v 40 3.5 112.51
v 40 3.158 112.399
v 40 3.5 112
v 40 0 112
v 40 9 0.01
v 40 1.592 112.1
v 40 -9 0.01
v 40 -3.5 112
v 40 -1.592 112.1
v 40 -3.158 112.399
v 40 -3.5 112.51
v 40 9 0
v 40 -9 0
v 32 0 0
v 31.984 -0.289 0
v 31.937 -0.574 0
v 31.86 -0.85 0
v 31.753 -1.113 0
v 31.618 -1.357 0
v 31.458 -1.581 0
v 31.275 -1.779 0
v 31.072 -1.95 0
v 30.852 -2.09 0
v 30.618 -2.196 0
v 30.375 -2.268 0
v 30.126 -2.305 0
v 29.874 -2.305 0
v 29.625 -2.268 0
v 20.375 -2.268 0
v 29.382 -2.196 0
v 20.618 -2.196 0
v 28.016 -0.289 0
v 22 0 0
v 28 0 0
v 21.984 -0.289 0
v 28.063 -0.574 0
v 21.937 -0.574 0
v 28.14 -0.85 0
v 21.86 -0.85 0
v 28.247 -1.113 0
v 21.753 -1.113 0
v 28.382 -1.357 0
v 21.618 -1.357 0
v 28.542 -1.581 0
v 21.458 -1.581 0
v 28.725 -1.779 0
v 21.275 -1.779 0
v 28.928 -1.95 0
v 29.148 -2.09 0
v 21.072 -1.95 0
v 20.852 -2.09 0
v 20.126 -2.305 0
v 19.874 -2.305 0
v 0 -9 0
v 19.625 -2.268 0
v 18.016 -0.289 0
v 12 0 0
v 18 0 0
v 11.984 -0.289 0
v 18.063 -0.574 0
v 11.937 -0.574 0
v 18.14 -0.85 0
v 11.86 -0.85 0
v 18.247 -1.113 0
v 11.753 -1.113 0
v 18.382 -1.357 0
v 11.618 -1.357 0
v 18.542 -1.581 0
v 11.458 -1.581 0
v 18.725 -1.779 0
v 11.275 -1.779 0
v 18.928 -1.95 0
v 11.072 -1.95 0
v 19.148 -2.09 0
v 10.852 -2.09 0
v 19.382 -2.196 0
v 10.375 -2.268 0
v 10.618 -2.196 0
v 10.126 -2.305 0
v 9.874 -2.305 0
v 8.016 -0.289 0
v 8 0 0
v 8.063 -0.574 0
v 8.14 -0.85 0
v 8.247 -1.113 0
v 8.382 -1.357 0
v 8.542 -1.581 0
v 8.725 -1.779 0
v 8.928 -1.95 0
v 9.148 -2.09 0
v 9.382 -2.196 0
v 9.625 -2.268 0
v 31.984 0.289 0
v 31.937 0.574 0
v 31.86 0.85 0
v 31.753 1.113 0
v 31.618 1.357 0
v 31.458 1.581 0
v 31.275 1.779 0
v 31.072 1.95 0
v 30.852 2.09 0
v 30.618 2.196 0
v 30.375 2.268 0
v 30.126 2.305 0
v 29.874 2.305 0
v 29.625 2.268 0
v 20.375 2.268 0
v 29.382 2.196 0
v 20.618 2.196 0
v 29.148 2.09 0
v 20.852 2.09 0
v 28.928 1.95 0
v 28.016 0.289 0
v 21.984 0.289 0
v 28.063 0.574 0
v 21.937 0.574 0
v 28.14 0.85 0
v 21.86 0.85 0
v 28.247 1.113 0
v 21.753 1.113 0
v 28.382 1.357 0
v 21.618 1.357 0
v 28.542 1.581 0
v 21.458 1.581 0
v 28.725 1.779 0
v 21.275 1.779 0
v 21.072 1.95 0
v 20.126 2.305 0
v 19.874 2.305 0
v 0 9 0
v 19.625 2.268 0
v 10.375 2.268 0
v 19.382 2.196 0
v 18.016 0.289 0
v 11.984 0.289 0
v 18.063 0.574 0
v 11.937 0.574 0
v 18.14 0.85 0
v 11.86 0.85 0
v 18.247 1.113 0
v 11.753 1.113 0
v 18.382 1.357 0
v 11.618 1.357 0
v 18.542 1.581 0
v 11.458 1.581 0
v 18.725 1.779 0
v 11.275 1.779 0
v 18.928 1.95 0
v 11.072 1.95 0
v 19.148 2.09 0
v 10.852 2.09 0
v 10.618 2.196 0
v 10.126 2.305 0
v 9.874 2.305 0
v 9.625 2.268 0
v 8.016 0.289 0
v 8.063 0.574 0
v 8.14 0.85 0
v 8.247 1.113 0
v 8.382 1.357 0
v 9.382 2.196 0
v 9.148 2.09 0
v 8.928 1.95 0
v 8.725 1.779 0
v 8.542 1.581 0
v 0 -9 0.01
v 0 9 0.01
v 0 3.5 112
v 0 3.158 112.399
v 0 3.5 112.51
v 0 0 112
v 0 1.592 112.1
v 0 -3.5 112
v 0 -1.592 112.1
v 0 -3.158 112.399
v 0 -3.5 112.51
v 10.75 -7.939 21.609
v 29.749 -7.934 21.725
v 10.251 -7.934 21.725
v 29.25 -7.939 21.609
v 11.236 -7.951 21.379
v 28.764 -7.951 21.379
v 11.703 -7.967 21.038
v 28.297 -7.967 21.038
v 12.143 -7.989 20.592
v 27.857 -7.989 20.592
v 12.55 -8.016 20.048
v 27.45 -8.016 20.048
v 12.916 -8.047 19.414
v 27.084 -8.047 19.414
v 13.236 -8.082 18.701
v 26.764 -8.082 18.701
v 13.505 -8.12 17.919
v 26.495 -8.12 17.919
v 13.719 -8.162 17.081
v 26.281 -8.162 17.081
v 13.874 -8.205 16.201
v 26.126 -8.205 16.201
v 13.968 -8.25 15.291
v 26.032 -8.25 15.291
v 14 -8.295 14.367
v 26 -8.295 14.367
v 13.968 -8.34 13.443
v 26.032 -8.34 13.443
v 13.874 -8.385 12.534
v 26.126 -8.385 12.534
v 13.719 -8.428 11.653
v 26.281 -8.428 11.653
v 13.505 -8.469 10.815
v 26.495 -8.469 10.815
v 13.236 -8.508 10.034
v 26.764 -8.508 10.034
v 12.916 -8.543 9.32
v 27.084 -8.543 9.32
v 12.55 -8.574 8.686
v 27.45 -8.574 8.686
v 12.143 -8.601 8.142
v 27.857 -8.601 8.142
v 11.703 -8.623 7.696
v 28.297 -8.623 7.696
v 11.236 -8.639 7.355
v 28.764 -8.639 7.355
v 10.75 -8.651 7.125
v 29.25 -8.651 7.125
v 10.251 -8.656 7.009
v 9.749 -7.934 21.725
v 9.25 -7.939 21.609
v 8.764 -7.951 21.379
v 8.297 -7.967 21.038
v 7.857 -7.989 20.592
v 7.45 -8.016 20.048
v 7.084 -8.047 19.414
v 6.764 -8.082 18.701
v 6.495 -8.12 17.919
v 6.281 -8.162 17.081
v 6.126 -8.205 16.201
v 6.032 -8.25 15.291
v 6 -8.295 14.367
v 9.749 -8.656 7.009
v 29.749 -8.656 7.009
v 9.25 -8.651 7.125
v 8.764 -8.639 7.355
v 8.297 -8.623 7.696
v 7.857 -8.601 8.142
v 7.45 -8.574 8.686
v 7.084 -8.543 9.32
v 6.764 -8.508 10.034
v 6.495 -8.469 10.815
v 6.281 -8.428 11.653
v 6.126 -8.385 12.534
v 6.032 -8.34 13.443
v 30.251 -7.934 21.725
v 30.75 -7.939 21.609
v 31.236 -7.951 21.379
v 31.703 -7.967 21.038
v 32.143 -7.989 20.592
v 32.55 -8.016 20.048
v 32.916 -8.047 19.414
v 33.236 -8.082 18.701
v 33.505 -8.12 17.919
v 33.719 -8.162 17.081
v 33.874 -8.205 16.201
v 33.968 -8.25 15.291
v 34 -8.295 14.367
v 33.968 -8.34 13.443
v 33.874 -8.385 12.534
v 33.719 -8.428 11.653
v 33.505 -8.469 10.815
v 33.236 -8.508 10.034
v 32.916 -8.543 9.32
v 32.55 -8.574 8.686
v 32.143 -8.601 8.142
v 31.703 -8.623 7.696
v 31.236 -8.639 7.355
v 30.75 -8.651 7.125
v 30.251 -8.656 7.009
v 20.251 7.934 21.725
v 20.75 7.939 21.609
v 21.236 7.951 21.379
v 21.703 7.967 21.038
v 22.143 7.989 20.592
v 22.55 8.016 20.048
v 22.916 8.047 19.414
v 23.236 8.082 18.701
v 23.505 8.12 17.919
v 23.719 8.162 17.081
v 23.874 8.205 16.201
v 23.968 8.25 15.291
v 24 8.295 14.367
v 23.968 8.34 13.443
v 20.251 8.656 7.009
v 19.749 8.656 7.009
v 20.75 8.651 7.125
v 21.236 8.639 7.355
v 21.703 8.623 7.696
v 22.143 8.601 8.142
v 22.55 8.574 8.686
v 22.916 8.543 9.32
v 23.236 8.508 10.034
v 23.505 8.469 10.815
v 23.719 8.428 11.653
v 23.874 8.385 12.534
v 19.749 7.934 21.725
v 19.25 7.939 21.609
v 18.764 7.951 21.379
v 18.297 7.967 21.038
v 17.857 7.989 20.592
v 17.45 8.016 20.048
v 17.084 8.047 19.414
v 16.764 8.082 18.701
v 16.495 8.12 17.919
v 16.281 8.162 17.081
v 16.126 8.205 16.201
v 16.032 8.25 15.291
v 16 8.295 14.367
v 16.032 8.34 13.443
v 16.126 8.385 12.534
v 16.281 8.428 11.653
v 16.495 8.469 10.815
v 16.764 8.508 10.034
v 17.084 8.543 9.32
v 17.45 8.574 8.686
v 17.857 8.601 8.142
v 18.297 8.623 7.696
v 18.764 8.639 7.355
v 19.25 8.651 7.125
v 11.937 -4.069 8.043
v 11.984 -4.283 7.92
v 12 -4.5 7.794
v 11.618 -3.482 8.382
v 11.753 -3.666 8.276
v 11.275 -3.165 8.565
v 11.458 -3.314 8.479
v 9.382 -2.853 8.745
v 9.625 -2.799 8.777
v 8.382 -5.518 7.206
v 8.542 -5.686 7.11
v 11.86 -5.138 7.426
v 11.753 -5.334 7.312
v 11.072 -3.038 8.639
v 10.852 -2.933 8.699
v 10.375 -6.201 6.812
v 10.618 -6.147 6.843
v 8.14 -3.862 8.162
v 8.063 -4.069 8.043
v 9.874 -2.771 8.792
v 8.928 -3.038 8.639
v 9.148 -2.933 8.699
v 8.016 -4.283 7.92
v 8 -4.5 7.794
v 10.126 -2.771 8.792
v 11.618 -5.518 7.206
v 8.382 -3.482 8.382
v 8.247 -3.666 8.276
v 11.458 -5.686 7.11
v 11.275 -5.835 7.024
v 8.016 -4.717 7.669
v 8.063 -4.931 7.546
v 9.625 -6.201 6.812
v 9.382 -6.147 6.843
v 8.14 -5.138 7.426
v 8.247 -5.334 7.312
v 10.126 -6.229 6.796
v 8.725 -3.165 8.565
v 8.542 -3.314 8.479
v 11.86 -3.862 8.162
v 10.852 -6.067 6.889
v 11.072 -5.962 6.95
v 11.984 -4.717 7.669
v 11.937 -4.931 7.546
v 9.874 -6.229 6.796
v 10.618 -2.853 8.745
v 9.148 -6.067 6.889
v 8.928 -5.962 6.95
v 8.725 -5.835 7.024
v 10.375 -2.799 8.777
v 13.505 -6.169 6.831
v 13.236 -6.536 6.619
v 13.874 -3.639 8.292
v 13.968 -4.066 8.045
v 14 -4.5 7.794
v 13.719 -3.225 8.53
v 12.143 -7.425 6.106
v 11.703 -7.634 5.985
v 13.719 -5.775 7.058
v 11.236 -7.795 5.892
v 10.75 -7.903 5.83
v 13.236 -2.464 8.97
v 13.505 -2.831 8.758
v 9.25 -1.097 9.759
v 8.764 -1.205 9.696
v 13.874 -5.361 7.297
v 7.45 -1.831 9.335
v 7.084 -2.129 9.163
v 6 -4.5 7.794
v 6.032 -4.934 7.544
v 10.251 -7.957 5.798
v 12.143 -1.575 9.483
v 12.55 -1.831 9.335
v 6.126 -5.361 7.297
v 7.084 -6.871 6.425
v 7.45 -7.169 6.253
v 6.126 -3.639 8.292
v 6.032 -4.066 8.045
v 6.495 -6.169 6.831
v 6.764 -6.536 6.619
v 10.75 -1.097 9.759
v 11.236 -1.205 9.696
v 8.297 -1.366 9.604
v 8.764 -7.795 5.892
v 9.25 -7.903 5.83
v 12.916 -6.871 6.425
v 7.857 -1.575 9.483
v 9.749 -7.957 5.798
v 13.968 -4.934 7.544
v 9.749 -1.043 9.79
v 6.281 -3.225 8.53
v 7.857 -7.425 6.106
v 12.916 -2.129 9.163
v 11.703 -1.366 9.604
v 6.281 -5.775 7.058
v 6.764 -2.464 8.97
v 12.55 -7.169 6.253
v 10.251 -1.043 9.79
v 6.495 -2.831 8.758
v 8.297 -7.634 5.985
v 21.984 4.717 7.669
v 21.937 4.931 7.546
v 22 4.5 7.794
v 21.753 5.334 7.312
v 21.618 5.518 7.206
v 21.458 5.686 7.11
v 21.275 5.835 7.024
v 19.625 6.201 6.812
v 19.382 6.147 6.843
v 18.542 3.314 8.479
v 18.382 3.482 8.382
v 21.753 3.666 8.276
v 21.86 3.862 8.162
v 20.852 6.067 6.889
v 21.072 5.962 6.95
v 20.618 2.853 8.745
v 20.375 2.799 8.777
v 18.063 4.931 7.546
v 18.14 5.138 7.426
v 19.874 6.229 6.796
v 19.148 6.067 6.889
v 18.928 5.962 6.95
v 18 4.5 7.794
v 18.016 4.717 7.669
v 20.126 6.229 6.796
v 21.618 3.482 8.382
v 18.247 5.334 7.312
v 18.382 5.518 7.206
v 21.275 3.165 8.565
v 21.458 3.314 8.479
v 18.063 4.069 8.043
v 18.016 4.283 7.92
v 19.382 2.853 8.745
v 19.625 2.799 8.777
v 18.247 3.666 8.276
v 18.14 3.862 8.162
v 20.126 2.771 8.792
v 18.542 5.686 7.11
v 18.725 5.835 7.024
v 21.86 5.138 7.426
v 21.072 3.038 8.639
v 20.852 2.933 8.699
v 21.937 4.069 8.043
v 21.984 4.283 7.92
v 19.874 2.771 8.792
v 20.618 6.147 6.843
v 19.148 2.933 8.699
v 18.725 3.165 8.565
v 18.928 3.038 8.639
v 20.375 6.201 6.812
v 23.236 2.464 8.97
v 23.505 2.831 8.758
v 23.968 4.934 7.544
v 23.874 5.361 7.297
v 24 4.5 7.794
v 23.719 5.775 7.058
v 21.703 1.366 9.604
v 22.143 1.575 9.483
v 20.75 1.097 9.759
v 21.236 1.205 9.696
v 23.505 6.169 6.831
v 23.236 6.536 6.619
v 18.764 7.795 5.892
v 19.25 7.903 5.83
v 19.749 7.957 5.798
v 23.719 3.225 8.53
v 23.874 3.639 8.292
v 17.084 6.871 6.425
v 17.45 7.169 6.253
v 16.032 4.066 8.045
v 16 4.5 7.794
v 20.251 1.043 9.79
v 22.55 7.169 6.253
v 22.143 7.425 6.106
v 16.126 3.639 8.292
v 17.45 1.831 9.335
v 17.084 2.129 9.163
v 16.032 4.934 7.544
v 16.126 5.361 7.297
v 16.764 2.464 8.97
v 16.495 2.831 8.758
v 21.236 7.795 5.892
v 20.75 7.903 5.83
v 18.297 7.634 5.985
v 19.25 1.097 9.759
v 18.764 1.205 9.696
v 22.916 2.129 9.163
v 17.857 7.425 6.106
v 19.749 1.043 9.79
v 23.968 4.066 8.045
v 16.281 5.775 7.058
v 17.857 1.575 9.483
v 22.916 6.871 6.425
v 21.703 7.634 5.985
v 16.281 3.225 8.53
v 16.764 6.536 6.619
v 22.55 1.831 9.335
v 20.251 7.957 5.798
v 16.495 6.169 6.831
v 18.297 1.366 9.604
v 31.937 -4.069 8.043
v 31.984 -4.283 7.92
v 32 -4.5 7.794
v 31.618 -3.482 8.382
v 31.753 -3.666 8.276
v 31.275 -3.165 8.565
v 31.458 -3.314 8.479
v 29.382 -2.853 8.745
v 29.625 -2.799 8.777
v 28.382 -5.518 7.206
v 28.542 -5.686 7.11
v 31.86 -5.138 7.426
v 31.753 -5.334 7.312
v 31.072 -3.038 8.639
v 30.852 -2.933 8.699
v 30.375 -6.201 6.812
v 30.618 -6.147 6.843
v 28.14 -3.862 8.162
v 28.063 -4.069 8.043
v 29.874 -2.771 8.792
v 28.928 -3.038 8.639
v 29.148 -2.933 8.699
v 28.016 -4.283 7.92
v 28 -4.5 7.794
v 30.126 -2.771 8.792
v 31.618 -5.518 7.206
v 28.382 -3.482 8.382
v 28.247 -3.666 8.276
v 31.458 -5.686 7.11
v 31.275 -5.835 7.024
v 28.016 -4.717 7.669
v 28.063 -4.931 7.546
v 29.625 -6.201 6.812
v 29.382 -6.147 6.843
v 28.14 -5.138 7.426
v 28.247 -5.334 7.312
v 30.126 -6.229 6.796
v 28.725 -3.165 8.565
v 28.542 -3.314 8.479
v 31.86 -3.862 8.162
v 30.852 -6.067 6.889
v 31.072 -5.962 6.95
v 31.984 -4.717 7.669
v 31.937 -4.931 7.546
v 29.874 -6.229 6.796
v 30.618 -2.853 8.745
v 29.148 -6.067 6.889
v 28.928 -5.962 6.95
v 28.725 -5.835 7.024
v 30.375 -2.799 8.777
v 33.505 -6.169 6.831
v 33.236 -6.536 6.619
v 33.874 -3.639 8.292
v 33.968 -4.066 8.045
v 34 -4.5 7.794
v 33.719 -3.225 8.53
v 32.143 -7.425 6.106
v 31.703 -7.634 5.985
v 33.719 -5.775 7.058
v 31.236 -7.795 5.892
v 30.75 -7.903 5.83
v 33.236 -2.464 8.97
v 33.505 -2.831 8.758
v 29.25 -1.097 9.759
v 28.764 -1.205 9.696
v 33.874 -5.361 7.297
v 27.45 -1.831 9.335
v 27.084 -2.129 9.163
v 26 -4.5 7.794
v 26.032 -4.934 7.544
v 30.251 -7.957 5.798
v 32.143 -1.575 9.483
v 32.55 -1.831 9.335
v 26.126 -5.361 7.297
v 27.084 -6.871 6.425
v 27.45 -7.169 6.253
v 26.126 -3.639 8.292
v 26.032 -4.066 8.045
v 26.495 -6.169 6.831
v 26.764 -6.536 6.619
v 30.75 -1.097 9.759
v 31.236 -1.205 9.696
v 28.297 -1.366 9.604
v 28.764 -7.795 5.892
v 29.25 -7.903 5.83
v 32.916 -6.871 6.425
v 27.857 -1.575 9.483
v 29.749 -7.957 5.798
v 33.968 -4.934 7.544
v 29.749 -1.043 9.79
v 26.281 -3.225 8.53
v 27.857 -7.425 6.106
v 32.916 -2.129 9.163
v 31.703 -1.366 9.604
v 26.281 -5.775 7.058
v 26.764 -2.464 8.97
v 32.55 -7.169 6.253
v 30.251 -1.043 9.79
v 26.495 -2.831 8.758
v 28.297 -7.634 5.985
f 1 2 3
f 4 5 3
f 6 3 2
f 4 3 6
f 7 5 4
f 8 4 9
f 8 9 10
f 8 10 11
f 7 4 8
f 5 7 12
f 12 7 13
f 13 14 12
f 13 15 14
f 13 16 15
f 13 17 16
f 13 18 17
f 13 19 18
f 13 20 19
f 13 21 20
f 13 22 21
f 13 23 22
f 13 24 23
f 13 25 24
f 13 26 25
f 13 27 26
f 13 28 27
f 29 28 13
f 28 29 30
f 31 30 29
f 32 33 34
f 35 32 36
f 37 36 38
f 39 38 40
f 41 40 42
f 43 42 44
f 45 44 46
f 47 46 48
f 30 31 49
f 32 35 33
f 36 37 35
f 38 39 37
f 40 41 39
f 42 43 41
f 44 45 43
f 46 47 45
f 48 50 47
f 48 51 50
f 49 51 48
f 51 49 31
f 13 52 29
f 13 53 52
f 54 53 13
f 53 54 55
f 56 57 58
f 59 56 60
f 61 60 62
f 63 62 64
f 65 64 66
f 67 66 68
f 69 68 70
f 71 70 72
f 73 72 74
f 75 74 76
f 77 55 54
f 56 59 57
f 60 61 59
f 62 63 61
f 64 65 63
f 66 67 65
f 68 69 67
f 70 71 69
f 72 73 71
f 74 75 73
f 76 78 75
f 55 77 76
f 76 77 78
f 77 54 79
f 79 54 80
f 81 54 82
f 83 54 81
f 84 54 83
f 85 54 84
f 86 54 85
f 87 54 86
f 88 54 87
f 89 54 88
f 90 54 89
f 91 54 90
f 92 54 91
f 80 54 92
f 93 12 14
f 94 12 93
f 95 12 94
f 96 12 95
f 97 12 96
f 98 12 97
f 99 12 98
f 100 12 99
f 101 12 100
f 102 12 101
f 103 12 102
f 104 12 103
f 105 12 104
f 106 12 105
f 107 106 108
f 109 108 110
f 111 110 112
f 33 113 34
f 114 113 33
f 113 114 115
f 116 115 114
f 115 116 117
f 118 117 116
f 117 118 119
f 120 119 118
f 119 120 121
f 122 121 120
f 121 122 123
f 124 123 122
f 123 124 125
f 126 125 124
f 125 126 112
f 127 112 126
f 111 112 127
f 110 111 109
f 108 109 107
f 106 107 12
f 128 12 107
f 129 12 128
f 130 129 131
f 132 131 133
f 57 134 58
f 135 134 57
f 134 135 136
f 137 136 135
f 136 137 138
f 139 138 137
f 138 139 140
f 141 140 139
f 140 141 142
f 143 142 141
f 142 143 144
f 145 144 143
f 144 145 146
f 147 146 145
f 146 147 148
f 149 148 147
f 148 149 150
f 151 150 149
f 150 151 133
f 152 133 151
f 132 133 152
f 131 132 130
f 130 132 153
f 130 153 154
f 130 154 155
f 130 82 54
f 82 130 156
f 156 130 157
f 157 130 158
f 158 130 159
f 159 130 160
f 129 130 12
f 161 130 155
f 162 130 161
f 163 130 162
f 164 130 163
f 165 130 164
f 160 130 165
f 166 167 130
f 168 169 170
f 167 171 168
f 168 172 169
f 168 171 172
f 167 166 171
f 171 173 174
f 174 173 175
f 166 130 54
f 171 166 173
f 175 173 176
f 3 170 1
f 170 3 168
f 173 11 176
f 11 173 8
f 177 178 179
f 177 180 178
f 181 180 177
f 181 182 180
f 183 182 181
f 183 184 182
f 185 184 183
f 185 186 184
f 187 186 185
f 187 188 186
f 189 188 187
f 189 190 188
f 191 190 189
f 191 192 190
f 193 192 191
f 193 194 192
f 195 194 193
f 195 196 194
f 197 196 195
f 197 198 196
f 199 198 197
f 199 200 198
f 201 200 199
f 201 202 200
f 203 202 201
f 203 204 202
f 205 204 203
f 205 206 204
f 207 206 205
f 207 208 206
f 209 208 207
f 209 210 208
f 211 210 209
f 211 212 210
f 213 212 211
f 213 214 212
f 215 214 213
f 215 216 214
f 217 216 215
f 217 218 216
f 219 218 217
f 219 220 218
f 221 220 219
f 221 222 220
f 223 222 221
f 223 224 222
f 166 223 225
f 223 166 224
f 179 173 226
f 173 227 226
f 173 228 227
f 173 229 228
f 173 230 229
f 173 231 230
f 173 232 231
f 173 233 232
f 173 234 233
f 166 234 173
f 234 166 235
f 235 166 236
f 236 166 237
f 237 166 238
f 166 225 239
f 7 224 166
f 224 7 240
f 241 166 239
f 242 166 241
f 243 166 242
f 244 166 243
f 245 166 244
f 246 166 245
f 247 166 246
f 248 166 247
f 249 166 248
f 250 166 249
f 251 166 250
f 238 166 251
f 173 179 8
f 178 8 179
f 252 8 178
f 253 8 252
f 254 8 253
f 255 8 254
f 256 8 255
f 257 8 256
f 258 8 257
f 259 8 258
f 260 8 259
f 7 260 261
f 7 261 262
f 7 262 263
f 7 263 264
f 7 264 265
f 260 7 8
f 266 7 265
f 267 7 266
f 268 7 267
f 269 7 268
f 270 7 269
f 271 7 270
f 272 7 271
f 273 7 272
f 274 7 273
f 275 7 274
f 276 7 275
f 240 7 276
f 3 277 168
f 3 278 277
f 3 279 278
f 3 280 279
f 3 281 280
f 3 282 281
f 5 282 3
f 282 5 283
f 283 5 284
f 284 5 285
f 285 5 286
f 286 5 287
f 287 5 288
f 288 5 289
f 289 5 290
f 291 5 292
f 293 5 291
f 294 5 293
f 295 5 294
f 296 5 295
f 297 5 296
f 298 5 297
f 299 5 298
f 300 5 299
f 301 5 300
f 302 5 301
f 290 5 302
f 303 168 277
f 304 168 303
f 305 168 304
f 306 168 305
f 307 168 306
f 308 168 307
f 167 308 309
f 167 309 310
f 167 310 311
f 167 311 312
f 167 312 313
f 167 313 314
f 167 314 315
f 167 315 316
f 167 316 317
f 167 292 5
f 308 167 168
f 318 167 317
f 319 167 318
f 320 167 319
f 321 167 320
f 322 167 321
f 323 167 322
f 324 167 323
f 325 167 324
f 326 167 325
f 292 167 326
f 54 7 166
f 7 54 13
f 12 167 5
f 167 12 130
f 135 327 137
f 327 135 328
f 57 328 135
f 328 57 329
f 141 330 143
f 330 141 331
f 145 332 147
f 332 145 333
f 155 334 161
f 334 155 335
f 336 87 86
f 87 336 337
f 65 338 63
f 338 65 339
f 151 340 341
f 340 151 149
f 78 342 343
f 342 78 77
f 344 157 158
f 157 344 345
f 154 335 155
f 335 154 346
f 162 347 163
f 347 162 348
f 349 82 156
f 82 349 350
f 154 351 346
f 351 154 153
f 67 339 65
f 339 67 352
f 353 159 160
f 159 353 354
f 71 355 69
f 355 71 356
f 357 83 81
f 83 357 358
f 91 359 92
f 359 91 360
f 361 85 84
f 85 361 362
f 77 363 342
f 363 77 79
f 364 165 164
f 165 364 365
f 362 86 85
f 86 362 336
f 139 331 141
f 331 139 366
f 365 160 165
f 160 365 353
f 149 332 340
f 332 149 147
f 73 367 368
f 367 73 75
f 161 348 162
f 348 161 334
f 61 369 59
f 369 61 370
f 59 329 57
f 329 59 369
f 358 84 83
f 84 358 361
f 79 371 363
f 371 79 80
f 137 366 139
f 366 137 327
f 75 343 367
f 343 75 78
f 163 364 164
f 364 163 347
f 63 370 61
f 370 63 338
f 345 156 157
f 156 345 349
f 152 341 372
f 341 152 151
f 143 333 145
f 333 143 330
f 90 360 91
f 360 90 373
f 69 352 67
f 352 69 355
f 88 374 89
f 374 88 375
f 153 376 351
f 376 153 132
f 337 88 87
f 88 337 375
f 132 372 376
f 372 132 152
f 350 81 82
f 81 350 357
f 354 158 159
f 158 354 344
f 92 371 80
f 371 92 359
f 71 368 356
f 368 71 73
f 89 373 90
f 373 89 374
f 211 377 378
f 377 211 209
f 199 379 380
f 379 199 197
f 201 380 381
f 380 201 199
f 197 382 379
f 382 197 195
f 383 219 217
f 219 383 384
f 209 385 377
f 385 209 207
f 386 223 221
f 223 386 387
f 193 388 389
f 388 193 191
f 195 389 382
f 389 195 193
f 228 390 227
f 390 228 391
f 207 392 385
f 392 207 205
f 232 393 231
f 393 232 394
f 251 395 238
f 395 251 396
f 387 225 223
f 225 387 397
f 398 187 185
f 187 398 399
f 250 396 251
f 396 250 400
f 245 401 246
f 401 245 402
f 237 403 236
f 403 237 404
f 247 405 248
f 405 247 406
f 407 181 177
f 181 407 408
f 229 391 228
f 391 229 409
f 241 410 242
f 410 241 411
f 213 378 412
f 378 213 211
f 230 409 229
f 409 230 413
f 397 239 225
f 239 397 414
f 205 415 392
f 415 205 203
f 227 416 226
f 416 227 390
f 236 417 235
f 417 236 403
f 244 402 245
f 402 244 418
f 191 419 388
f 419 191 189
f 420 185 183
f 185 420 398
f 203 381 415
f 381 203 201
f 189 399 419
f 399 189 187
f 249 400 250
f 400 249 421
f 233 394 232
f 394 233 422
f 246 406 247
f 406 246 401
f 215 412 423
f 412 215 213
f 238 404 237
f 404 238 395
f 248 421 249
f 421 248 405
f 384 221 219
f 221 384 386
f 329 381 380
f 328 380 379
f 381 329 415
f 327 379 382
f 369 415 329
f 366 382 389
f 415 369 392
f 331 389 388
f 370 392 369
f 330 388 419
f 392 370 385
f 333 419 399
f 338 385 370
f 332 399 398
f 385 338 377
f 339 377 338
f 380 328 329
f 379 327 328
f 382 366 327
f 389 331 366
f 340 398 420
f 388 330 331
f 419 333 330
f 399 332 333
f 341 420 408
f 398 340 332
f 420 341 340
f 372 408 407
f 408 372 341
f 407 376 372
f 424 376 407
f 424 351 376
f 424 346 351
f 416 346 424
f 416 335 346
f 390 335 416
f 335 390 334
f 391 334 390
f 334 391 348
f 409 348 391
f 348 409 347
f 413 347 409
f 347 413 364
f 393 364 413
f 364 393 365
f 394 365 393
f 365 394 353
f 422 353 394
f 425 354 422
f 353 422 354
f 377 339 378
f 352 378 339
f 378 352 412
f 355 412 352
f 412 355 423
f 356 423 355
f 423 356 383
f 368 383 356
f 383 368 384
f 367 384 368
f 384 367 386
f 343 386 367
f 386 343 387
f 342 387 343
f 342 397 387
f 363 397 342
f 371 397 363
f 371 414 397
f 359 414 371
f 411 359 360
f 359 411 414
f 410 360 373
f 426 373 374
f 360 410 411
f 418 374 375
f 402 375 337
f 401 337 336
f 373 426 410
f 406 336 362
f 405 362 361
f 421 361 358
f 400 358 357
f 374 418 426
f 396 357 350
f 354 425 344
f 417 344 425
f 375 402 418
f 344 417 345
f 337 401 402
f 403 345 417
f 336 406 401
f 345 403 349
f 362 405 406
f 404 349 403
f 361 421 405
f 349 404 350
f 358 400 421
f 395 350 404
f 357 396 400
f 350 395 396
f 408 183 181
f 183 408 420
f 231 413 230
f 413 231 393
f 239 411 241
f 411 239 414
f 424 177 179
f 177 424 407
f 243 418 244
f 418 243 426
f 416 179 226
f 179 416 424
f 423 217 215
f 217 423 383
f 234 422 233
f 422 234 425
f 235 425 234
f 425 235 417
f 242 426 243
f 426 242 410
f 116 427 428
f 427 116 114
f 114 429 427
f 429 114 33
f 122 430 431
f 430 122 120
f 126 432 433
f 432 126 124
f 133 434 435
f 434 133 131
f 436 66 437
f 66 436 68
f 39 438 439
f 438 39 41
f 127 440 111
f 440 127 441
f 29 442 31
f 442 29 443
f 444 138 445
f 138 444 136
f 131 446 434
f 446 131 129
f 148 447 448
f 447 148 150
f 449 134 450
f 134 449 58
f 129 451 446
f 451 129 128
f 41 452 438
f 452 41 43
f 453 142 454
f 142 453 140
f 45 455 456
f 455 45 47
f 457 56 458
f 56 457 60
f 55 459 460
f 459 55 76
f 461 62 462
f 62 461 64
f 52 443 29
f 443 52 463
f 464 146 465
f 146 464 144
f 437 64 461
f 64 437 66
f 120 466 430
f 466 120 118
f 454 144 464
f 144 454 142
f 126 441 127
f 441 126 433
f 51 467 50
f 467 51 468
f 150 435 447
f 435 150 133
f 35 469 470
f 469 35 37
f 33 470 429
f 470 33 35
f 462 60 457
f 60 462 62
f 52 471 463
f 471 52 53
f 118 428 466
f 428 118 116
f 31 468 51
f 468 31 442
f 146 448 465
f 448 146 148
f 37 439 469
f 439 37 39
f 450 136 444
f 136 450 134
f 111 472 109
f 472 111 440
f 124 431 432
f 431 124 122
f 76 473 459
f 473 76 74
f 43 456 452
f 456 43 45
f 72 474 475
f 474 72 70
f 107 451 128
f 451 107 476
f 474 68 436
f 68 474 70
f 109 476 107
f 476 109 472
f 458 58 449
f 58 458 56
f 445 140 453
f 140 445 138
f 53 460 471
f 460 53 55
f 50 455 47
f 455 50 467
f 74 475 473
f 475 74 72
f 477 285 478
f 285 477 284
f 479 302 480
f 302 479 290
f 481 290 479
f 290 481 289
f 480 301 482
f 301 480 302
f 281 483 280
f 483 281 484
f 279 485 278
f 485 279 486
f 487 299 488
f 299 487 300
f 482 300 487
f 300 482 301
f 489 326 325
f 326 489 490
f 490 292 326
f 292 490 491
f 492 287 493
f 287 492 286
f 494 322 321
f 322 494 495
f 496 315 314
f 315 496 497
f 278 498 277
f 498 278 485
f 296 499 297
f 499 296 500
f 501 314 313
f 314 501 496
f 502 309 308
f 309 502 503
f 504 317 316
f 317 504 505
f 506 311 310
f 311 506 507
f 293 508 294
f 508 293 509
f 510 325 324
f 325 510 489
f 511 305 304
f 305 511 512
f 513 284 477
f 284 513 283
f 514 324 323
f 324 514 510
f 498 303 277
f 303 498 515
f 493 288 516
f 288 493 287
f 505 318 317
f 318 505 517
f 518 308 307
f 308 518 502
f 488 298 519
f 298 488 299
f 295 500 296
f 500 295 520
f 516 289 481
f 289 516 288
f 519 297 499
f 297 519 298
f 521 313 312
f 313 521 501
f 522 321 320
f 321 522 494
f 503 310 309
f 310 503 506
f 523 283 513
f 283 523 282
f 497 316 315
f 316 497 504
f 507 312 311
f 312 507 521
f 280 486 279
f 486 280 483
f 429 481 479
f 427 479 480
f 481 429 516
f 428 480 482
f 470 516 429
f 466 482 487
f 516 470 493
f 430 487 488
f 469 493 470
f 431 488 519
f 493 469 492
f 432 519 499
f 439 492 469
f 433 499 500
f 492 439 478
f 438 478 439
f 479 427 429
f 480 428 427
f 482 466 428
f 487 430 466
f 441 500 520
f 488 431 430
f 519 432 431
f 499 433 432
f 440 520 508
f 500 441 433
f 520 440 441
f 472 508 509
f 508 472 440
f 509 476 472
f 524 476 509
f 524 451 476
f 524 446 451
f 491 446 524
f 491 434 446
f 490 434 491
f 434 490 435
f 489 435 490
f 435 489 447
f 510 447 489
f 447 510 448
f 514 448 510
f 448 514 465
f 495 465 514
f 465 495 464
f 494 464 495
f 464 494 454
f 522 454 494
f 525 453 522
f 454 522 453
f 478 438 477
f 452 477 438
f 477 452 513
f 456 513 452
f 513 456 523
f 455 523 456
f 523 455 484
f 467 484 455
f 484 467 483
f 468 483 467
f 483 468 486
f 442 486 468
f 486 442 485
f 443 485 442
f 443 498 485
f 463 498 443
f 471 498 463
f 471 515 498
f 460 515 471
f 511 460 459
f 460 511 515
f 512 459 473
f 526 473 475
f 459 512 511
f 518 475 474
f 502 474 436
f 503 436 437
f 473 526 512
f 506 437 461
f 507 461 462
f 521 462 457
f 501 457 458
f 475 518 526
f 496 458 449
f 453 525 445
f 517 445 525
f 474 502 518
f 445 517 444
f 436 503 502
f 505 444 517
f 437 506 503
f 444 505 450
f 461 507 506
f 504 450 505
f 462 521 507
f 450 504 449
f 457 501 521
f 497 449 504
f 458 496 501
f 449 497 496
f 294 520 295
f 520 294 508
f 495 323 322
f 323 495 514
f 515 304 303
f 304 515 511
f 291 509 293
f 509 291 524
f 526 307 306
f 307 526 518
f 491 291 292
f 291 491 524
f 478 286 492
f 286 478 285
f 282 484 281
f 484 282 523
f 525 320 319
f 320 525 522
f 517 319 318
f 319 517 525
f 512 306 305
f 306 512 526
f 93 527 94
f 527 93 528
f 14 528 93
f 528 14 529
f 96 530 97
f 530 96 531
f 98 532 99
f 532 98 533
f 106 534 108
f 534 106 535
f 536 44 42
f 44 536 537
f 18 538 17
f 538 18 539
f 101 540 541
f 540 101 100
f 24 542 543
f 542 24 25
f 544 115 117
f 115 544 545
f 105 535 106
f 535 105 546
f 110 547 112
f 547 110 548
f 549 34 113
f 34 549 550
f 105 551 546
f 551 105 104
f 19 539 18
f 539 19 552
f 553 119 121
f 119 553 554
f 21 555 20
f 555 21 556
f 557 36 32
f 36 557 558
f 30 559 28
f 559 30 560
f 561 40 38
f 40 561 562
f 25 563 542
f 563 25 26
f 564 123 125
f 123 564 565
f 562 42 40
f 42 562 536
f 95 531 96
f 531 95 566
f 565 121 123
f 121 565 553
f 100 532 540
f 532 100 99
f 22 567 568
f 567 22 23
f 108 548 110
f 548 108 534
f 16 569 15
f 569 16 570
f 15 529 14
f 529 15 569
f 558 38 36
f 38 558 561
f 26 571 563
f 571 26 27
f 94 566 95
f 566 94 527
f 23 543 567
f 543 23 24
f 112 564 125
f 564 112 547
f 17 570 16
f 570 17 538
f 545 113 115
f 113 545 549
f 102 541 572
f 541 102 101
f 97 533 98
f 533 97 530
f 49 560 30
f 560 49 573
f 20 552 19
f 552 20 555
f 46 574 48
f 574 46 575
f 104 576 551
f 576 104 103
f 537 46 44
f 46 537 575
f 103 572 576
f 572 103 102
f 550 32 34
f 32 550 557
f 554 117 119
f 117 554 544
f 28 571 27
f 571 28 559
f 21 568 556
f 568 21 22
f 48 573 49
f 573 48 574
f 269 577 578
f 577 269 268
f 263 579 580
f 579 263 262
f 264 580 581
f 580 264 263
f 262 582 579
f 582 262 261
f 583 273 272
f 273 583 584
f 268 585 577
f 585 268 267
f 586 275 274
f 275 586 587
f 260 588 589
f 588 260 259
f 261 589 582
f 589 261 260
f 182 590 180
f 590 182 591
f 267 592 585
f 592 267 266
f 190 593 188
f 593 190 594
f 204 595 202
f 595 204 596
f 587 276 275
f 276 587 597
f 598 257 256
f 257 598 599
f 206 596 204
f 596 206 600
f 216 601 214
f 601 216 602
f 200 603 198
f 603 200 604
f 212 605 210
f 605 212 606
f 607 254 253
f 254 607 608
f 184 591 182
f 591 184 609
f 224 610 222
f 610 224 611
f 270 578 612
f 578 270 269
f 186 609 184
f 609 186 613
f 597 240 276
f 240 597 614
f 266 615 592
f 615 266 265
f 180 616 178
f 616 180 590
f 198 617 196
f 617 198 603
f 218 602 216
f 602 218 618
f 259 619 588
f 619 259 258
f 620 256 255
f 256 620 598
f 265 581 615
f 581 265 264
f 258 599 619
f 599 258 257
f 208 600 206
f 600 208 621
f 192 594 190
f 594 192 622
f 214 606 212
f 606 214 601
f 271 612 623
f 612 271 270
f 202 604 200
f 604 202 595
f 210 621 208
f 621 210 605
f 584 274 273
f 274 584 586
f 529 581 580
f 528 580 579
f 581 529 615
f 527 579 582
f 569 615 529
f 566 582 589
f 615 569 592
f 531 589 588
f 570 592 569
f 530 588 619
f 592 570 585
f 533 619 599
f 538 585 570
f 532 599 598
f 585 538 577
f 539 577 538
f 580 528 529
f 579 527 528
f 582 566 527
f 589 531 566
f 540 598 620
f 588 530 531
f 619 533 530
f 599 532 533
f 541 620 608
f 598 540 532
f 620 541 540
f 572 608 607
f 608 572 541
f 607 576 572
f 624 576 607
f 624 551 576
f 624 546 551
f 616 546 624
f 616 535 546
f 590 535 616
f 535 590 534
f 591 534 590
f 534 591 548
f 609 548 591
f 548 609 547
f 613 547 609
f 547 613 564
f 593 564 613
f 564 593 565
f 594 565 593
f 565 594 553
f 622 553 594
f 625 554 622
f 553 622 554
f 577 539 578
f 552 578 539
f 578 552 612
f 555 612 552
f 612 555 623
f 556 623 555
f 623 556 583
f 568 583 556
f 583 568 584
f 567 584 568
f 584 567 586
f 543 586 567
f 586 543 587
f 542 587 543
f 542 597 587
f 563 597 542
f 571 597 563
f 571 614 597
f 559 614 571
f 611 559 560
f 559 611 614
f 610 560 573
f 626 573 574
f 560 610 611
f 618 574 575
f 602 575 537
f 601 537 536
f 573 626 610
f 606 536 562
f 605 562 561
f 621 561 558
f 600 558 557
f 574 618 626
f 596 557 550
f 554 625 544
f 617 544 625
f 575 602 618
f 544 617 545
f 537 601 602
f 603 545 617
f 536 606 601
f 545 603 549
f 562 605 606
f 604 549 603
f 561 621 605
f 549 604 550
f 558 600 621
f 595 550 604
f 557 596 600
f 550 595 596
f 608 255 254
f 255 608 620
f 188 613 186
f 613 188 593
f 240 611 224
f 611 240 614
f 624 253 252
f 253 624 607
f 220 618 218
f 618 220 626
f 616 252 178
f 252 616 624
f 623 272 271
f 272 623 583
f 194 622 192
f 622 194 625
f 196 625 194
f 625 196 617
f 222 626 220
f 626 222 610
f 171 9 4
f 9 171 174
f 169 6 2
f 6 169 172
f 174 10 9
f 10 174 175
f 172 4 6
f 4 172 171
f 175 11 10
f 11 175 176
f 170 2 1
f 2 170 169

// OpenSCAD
/* [Dimensions] */

// measured distance from the base to the bottom of the tube (mm)
height = 112; 

// width of the support at the base (mm)
width = 40;

// thickness of the support at the top where it connects to the rail (mm)
depth = 7; 

// thickness of the support at the base (mm)
baseDepth = 18; 

// diameter of the tube (mm)
diameter = 25.4; 

/* [Screws] */

// diameter of the screw hole (mm)
screwDiameter = 4; 

// diameter of the screw head (mm)
screwHeadDiameter = 8;

// offset of the screw head from the bottom (mm)
screwHeadOffset = 9; 

// number of screws
screwCount = 3; 

// angle of the screw holes (degrees)
screwAngle = 30; 

difference() {
    union() {
        translate([0,-depth/2,0]) cube([width,depth,height+diameter/2]);
        hull() { 
            translate([0,-baseDepth/2,0]) cube([width, baseDepth,0.01]);
            translate([0,-depth/2,0]) cube([width,depth,height]);
        }
    }
    translate([0,0,height+diameter/2]) rotate([0,90,0])
        cylinder(r=diameter/2, h=width, $fn=50);
    for(i=[1:screwCount])
    translate([i*width/(screwCount+1),0,0]) rotate([(i%2==0?-1:1) * screwAngle,0,0]) {
        cylinder(r=screwDiameter/2, h=height, center=true, $fn=50);
        translate([0,0,screwHeadOffset]) cylinder(r=screwHeadDiameter/2, h=height, $fn=50);
    }
}
